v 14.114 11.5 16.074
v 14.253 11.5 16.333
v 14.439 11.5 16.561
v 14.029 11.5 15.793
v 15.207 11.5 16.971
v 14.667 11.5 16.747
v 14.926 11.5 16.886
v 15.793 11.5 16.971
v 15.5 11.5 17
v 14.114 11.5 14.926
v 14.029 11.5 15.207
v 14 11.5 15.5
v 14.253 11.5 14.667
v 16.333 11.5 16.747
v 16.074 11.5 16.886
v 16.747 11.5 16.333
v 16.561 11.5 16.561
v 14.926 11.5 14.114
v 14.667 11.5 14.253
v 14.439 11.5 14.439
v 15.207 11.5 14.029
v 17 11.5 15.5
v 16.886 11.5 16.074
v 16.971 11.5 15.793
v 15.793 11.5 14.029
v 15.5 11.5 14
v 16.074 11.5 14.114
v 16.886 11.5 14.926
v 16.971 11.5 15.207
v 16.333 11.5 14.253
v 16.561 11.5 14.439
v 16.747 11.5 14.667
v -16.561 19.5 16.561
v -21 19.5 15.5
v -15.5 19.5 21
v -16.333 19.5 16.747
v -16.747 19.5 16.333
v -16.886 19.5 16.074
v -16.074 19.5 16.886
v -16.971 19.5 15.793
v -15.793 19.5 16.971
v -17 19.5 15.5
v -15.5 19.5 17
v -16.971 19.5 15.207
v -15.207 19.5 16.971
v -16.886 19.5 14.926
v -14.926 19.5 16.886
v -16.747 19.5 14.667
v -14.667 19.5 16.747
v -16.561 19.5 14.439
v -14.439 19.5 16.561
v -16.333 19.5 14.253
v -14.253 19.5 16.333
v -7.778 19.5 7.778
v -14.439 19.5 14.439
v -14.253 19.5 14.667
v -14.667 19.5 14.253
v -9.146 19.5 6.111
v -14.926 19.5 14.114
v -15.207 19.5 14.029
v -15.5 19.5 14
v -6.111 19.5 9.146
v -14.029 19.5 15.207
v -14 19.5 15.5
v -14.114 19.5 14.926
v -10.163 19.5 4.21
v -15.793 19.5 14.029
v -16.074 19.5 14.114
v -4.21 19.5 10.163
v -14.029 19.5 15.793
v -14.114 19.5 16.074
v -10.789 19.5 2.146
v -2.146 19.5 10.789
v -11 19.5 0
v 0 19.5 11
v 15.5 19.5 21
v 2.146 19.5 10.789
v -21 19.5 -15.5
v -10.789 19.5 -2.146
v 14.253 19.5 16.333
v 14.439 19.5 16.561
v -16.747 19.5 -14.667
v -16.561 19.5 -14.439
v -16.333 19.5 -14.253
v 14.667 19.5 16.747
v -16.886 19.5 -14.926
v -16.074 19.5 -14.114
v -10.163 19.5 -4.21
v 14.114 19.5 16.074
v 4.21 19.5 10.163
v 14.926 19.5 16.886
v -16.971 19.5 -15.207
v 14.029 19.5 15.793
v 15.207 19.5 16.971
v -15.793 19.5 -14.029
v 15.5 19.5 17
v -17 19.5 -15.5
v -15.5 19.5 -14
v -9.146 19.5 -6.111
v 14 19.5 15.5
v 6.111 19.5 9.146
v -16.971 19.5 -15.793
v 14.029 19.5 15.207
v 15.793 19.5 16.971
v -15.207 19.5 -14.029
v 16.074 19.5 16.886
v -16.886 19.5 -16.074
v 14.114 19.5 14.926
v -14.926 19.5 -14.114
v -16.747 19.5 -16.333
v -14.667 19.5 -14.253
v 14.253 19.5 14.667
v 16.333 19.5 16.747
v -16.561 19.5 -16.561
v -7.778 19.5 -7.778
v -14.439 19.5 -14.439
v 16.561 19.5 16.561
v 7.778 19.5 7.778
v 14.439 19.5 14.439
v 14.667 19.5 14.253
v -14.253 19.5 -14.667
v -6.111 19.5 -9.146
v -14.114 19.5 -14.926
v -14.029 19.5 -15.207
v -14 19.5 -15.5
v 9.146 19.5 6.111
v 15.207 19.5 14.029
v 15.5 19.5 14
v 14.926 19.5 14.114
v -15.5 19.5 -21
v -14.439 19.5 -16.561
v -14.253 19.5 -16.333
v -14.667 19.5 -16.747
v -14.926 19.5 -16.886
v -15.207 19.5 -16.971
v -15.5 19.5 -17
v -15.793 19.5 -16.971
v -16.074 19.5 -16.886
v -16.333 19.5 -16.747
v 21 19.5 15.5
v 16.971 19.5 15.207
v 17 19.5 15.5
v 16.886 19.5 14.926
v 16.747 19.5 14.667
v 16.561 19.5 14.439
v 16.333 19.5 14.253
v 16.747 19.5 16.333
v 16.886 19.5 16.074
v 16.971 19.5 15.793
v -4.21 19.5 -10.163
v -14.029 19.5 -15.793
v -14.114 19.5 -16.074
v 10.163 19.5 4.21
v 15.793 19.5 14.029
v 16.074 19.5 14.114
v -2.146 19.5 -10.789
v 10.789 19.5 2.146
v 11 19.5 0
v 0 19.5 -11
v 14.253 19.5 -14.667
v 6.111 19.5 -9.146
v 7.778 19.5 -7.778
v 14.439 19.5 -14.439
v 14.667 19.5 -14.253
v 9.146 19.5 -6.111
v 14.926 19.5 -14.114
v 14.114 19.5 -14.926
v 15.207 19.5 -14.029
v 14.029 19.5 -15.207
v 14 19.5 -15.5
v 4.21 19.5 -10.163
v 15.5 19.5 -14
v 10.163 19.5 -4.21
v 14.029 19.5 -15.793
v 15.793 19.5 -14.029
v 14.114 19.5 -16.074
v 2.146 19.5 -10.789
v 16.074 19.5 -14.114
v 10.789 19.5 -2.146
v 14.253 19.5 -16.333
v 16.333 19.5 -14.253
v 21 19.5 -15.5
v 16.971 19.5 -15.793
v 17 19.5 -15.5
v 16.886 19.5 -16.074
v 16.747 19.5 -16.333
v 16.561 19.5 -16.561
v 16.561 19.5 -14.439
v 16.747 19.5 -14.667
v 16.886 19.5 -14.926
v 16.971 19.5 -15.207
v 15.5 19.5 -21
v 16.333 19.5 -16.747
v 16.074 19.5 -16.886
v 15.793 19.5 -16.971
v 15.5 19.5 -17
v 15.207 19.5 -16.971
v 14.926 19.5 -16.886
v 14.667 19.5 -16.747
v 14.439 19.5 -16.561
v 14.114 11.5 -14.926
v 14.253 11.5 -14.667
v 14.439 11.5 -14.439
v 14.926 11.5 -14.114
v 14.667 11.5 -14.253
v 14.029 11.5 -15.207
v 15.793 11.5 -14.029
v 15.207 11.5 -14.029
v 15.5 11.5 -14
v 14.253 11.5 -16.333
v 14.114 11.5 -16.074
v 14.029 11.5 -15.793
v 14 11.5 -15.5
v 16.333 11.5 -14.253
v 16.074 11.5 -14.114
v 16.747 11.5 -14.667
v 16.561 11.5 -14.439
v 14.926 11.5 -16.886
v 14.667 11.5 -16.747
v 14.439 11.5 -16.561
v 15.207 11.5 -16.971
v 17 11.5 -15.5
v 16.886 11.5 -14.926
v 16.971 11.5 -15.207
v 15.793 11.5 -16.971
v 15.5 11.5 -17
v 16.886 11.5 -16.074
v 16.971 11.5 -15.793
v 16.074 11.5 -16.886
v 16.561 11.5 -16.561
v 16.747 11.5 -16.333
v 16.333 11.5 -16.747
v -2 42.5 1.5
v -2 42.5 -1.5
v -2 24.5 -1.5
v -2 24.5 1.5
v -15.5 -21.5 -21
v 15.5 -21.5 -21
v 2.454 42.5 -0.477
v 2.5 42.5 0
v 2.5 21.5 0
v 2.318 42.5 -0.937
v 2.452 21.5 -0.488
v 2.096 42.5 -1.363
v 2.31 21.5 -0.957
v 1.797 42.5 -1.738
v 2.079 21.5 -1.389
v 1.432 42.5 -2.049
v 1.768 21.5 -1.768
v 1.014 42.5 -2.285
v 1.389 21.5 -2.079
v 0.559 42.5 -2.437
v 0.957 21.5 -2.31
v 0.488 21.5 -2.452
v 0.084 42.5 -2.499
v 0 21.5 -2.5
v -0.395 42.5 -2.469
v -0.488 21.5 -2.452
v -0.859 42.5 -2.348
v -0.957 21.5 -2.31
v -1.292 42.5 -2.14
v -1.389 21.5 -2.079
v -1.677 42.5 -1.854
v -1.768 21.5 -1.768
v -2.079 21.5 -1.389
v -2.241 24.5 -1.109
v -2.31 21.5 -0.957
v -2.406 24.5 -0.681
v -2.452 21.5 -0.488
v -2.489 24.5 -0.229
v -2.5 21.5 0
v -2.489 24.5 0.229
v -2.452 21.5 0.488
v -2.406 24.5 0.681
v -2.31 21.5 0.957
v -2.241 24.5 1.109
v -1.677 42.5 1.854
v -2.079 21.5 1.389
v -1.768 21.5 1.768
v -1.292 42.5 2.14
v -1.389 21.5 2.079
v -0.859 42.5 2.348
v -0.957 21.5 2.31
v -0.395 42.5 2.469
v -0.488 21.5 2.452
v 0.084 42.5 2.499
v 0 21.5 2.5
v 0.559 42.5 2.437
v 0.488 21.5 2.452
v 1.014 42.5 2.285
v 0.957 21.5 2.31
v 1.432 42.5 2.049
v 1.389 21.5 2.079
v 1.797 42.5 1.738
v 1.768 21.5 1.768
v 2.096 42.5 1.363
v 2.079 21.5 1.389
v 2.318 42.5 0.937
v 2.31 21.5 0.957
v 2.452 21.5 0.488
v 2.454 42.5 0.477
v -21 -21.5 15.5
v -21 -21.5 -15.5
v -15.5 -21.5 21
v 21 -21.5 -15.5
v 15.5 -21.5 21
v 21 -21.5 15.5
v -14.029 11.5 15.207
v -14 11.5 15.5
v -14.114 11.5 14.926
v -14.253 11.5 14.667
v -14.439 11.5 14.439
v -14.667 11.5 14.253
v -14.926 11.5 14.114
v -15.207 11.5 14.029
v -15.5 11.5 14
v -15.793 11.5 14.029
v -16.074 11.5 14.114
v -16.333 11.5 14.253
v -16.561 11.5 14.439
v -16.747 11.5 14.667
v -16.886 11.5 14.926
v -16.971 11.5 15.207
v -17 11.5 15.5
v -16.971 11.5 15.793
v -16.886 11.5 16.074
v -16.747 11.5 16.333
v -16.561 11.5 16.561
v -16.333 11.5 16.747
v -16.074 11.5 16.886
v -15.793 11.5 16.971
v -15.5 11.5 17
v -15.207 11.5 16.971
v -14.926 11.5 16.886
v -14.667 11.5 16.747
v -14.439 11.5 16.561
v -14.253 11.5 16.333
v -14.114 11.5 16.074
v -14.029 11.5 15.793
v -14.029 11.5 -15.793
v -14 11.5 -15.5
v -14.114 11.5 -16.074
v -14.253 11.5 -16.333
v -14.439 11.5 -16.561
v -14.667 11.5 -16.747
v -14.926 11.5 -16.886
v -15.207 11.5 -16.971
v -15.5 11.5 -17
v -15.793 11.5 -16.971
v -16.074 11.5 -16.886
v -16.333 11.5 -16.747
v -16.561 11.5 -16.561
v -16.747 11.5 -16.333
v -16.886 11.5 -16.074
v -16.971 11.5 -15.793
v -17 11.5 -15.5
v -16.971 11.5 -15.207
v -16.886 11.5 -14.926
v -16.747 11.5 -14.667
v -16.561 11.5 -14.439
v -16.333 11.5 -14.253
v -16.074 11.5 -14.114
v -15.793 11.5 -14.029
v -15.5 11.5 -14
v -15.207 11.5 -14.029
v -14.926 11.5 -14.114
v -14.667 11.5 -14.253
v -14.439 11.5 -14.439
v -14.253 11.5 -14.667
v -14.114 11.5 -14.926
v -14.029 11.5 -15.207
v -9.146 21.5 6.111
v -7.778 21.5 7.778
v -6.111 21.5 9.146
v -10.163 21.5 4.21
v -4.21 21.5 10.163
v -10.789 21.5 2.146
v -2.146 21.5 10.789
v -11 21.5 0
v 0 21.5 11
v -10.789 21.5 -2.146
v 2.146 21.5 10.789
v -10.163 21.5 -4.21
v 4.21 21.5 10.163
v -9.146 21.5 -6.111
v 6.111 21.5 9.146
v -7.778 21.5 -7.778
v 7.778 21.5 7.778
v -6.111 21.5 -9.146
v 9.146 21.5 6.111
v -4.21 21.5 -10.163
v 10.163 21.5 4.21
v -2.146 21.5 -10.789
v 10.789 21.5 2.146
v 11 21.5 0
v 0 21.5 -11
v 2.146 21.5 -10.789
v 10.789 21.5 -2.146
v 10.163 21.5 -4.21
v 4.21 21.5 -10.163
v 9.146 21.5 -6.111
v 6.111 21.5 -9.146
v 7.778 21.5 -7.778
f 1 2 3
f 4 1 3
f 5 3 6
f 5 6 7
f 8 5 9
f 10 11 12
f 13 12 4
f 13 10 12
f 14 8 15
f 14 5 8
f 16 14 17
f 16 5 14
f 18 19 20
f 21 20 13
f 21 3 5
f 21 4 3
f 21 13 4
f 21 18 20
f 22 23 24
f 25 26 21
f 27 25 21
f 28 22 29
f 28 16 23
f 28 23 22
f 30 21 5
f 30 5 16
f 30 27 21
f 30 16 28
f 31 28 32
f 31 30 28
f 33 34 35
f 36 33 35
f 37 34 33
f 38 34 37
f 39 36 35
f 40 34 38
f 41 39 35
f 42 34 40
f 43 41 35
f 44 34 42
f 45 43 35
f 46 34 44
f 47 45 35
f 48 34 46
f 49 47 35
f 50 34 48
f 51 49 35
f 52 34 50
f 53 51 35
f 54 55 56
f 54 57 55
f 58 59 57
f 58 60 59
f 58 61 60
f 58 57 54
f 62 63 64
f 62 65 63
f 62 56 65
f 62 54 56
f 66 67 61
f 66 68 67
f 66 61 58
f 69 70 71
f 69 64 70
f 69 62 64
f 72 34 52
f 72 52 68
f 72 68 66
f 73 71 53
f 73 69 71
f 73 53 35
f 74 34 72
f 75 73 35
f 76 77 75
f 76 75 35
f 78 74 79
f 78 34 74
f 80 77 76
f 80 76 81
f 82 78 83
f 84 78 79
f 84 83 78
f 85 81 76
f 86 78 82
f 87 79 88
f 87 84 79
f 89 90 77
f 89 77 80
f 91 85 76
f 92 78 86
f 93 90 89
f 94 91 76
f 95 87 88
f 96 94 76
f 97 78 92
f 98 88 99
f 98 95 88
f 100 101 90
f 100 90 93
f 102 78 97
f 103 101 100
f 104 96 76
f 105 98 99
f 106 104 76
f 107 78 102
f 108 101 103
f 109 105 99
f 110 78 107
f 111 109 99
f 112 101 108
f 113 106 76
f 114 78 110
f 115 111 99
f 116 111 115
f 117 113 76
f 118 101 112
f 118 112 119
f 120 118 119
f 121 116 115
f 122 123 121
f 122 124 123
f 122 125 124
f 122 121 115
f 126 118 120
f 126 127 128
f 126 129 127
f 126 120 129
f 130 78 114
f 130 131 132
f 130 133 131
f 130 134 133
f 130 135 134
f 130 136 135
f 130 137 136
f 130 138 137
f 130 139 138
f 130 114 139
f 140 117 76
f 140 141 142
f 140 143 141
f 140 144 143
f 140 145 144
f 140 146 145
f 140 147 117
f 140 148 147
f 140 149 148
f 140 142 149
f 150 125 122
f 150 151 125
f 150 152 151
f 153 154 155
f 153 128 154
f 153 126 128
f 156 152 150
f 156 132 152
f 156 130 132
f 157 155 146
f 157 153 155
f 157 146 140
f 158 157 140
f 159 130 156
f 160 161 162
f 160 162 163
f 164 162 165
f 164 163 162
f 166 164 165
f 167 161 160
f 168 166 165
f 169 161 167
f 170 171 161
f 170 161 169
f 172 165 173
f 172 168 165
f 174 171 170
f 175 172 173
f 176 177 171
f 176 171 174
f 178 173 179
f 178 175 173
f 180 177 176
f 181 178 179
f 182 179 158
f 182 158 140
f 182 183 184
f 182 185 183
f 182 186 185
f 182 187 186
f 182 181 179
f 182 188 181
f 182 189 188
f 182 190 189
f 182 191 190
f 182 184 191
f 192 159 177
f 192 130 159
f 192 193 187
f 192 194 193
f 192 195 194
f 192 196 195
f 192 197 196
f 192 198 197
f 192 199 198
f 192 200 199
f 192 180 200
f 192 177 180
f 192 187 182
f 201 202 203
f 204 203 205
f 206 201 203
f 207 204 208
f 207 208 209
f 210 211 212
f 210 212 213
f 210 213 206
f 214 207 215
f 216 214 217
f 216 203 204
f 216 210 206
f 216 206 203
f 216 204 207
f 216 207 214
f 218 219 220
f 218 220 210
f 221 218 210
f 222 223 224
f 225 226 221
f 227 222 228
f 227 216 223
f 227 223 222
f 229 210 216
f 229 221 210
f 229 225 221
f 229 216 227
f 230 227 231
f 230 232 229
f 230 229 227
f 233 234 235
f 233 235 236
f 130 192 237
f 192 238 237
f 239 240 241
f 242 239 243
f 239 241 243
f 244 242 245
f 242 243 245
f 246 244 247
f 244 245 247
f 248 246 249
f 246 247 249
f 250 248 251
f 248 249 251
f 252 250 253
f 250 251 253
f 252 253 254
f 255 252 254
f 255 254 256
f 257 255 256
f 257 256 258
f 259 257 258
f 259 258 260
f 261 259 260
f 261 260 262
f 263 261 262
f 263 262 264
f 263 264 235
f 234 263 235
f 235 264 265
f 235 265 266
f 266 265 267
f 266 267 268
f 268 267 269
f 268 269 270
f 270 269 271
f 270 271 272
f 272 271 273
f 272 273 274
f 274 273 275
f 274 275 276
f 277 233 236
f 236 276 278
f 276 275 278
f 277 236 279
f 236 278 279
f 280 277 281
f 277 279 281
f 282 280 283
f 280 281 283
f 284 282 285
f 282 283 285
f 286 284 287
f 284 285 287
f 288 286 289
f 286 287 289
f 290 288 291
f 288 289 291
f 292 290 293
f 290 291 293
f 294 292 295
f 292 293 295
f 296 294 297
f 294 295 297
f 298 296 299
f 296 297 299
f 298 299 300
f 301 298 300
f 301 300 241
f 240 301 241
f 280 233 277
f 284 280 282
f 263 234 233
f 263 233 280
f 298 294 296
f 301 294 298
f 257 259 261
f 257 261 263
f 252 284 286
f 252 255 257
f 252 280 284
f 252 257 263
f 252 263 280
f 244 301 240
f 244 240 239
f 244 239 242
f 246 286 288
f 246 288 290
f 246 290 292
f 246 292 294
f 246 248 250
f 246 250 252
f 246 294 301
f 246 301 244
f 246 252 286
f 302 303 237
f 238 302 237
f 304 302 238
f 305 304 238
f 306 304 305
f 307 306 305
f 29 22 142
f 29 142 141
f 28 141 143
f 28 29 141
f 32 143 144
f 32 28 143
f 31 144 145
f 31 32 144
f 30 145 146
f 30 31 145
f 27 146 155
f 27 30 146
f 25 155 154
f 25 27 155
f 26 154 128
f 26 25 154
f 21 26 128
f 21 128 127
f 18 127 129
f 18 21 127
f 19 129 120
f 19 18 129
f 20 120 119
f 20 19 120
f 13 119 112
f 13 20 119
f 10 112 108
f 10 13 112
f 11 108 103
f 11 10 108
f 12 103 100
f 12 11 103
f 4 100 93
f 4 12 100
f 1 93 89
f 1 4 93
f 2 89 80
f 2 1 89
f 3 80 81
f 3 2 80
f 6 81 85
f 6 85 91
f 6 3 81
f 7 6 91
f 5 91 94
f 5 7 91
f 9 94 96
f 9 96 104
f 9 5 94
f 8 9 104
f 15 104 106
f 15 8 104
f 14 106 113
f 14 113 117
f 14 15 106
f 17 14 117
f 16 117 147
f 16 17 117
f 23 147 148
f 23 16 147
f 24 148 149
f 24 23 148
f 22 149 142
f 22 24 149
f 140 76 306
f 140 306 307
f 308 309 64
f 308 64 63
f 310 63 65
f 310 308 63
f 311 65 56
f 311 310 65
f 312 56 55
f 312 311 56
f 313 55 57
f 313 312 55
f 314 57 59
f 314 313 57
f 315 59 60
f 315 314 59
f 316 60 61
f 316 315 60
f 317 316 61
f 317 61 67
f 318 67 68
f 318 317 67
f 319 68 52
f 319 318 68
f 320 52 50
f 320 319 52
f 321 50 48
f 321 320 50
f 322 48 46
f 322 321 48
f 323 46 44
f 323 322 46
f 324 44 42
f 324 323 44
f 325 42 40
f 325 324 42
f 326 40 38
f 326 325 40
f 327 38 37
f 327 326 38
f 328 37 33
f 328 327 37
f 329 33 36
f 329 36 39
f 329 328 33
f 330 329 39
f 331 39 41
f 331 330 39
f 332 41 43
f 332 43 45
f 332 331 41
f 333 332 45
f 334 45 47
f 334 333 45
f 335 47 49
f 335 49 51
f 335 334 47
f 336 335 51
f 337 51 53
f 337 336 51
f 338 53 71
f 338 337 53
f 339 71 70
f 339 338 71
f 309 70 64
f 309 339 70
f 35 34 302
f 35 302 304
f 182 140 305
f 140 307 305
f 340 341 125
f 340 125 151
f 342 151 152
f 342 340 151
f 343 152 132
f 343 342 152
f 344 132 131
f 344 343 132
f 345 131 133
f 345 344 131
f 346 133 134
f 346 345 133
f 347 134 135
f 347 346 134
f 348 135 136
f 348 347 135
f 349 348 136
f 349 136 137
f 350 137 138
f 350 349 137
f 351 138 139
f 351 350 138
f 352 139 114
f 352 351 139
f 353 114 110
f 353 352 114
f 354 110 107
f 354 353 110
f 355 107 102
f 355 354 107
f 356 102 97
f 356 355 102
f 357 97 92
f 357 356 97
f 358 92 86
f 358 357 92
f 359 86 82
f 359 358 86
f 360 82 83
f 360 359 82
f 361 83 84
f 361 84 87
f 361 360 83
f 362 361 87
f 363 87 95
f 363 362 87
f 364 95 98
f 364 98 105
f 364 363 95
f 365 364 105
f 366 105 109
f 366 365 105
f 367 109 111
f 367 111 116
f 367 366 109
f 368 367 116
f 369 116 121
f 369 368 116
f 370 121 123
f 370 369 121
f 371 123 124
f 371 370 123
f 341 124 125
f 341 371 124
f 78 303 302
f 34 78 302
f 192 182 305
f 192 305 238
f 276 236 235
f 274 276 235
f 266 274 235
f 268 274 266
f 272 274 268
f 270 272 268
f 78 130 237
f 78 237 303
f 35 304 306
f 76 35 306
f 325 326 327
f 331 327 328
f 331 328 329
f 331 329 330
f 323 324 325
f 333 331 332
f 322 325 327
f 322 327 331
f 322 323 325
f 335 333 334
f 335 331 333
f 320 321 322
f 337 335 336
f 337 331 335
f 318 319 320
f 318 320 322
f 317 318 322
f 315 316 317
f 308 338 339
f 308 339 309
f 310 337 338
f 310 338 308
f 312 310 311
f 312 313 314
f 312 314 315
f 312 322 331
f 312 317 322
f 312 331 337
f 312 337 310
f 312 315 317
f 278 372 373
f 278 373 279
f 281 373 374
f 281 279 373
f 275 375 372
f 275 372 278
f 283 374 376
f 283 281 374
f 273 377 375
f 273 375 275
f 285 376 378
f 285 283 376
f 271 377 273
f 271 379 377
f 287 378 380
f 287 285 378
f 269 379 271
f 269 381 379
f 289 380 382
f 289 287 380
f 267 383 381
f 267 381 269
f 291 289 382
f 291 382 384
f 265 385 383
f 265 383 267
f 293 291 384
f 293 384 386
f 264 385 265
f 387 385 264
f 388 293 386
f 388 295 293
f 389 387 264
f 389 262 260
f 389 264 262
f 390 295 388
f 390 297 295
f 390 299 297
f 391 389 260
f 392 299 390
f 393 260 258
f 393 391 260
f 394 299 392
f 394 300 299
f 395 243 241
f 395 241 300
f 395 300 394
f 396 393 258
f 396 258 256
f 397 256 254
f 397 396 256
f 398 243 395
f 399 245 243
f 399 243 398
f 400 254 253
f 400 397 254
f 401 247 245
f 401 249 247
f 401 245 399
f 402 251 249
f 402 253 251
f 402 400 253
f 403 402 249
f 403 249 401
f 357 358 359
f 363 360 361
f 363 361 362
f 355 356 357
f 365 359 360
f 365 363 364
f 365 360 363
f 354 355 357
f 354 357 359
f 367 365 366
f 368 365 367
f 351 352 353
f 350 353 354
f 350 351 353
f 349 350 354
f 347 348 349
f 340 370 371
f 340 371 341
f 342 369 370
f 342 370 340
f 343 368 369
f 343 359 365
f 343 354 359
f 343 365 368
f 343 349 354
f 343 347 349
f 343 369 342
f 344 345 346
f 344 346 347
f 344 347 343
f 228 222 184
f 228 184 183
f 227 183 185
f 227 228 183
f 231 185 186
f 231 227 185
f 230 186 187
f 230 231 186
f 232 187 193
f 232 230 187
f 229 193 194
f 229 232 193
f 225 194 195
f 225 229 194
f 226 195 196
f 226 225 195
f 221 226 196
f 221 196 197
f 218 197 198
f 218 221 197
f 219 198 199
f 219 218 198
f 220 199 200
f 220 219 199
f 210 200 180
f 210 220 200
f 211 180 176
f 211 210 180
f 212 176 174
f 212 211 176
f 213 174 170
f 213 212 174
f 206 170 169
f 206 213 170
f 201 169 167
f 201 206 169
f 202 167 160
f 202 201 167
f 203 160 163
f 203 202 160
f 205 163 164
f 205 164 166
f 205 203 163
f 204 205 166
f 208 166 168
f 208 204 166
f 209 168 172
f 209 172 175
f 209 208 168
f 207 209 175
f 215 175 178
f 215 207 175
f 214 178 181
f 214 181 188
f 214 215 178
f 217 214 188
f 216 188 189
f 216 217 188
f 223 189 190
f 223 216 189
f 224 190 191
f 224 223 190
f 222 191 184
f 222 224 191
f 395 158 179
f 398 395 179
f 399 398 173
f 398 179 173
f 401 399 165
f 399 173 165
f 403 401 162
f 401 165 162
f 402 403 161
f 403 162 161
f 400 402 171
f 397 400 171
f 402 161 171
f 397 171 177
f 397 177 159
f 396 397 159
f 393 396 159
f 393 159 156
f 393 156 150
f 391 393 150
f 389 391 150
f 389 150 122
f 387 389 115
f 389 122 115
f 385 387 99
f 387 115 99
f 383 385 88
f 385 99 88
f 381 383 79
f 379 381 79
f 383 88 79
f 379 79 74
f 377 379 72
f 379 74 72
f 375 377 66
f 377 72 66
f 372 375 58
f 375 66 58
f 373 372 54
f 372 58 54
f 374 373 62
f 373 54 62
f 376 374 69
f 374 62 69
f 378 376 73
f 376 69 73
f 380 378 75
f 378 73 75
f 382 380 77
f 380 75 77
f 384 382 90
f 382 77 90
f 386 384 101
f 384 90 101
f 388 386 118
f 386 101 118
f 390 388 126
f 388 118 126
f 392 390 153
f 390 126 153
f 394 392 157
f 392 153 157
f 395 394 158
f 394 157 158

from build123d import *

# Parameters (mm, degrees)
BOSS_EXTRUDE1_DEPTH = 11.5
BOSS_EXTRUDE2_DEPTH = 10
SKETCH4_R           = 1.5
BOSS_EXTRUDE3_DEPTH = 8
SKETCH5_R           = 11
BOSS_EXTRUDE4_DEPTH = 2
SKETCH6_R           = 2.5
BOSS_EXTRUDE5_DEPTH = 21
CUT_EXTRUDE1_DEPTH  = 18


with BuildPart() as part:
    # Sketch1 → Boss-Extrude1 (new body, symmetric)
    with BuildSketch(Plane(origin=(0, 0, 0), x_dir=(1, 0, 0), z_dir=(0, 1, 0))):
        Polygon((-15.5, -21), (15.5, -21), (21, -15.5), (21, 15.5), (15.5, 21), (-15.5, 21), (-21, 15.5), (-21, -15.5), align=None)
    extrude(amount=BOSS_EXTRUDE1_DEPTH, both=True)

    # Sketch3 → Boss-Extrude2 (add)
    with BuildSketch(Plane.XZ.offset(11.5)):
        Polygon((15.5, 21), (-15.5, 21), (-21, 15.5), (-21, -15.5), (-15.5, -21), (15.5, -21), (21, -15.5), (21, 15.5), align=None)
    extrude(amount=BOSS_EXTRUDE2_DEPTH)

    # Sketch4 → Boss-Extrude3 (add)
    with BuildSketch(Plane(origin=(0, 11.5, 0), x_dir=(1, 0, 0), z_dir=(0, 1, 0))):
        Polygon((-15.5, -21), (15.5, -21), (21, -15.5), (21, 15.5), (15.5, 21), (-15.5, 21), (-21, 15.5), (-21, -15.5), align=None)
        with Locations((-15.5, 15.5)):
            Circle(SKETCH4_R, mode=Mode.SUBTRACT)
        with Locations((15.5, 15.5)):
            Circle(SKETCH4_R, mode=Mode.SUBTRACT)
        with Locations((-15.5, -15.5)):
            Circle(SKETCH4_R, mode=Mode.SUBTRACT)
        with Locations((15.5, -15.5)):
            Circle(SKETCH4_R, mode=Mode.SUBTRACT)
    extrude(amount=BOSS_EXTRUDE3_DEPTH)

    # Sketch5 → Boss-Extrude4 (add)
    with BuildSketch(Plane(origin=(0, 19.5, 0), x_dir=(1, 0, 0), z_dir=(0, 1, 0))):
        Circle(SKETCH5_R)
    extrude(amount=BOSS_EXTRUDE4_DEPTH)

    # Sketch6 → Boss-Extrude5 (add)
    with BuildSketch(Plane(origin=(0, 21.5, 0), x_dir=(1, 0, 0), z_dir=(0, 1, 0))):
        Circle(SKETCH6_R)
    extrude(amount=BOSS_EXTRUDE5_DEPTH)

    # Sketch9 → Cut-Extrude1 (cut)
    with BuildSketch(Plane(origin=(0, 42.5, 0), x_dir=(1, 0, 0), z_dir=(0, 1, 0))):
        with BuildLine():
            Line((-2, 1.5), (-2, -1.5))
            ThreePointArc((-2, -1.5), (-2.5, 0), (-2, 1.5))
        make_face()
    extrude(amount=-CUT_EXTRUDE1_DEPTH, mode=Mode.SUBTRACT)


solid = part.part
